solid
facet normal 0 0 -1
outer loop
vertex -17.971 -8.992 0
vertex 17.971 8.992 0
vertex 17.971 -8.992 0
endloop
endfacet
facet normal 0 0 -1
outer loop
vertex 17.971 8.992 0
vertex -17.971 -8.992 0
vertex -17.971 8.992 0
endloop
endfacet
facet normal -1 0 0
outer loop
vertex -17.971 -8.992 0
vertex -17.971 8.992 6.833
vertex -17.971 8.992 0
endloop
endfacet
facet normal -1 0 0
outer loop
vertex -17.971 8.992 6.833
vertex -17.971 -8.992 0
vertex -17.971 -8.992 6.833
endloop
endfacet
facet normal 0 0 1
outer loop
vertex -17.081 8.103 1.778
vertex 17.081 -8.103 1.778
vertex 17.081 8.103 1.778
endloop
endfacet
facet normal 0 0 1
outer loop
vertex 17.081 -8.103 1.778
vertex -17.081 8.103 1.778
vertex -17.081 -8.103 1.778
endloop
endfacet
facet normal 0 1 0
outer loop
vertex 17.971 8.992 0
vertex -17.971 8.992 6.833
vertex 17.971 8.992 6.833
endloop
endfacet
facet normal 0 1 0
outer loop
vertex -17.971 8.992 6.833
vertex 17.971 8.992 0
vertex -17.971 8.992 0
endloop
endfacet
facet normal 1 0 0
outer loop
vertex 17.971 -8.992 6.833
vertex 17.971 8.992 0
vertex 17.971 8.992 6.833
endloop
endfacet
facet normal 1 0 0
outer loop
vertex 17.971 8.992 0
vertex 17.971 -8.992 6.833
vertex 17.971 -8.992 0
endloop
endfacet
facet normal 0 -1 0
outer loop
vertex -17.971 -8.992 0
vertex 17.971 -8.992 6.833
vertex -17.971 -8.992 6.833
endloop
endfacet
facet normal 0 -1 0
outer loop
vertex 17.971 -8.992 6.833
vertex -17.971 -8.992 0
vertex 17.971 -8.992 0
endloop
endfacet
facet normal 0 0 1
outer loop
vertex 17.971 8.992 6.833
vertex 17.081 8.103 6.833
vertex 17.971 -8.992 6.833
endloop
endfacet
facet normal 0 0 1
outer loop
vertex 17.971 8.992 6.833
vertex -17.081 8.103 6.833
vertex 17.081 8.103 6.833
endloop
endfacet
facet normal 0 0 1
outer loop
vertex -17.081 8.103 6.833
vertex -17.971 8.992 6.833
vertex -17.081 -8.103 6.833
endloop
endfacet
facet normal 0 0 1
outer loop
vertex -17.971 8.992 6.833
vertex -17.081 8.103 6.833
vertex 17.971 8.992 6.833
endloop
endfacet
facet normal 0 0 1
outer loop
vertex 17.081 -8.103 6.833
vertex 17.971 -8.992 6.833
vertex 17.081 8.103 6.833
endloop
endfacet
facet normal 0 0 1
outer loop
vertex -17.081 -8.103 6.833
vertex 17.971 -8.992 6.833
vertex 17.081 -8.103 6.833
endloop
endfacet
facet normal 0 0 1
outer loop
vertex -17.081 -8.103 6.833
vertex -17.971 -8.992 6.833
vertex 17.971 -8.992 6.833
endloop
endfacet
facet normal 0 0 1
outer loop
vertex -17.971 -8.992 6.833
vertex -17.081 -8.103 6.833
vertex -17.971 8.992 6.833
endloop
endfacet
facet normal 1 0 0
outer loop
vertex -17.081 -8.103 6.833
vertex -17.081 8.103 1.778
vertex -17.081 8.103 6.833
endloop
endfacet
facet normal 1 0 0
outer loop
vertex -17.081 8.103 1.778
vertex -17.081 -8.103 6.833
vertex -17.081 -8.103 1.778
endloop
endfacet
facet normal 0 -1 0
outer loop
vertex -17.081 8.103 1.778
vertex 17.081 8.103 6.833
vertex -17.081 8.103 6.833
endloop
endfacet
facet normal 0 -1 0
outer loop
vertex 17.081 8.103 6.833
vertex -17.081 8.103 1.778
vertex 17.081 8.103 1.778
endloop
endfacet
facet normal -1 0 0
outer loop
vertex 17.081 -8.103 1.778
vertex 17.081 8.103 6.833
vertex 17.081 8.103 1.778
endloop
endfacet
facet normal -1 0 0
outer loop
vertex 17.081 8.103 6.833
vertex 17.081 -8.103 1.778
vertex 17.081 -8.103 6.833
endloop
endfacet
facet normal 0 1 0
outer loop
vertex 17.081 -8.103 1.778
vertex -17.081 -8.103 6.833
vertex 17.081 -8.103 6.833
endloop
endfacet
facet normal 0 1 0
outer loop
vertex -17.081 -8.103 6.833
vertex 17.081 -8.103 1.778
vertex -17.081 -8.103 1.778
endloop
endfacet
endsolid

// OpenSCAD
ViewScale = [0.0254, 0.0254, 0.0254];

module endcap()
{
    boxW = 1330;
    boxH = 623;
    pad = 15;

    linear_extrude(70)
    square([boxW + 70 + pad, boxH + 70 + pad], center=true);

    translate([0, 0, 69])
    linear_extrude(200)
    difference()
    {
        square([boxW + 70 + pad, boxH + 70 + pad], center=true);
        square([boxW + pad, boxH + pad], center=true);
    }
}

module forViewing()
{
    case();
}

module forPrinting()
{
    endcap();
}

scale(ViewScale)
{
    forPrinting();
}
